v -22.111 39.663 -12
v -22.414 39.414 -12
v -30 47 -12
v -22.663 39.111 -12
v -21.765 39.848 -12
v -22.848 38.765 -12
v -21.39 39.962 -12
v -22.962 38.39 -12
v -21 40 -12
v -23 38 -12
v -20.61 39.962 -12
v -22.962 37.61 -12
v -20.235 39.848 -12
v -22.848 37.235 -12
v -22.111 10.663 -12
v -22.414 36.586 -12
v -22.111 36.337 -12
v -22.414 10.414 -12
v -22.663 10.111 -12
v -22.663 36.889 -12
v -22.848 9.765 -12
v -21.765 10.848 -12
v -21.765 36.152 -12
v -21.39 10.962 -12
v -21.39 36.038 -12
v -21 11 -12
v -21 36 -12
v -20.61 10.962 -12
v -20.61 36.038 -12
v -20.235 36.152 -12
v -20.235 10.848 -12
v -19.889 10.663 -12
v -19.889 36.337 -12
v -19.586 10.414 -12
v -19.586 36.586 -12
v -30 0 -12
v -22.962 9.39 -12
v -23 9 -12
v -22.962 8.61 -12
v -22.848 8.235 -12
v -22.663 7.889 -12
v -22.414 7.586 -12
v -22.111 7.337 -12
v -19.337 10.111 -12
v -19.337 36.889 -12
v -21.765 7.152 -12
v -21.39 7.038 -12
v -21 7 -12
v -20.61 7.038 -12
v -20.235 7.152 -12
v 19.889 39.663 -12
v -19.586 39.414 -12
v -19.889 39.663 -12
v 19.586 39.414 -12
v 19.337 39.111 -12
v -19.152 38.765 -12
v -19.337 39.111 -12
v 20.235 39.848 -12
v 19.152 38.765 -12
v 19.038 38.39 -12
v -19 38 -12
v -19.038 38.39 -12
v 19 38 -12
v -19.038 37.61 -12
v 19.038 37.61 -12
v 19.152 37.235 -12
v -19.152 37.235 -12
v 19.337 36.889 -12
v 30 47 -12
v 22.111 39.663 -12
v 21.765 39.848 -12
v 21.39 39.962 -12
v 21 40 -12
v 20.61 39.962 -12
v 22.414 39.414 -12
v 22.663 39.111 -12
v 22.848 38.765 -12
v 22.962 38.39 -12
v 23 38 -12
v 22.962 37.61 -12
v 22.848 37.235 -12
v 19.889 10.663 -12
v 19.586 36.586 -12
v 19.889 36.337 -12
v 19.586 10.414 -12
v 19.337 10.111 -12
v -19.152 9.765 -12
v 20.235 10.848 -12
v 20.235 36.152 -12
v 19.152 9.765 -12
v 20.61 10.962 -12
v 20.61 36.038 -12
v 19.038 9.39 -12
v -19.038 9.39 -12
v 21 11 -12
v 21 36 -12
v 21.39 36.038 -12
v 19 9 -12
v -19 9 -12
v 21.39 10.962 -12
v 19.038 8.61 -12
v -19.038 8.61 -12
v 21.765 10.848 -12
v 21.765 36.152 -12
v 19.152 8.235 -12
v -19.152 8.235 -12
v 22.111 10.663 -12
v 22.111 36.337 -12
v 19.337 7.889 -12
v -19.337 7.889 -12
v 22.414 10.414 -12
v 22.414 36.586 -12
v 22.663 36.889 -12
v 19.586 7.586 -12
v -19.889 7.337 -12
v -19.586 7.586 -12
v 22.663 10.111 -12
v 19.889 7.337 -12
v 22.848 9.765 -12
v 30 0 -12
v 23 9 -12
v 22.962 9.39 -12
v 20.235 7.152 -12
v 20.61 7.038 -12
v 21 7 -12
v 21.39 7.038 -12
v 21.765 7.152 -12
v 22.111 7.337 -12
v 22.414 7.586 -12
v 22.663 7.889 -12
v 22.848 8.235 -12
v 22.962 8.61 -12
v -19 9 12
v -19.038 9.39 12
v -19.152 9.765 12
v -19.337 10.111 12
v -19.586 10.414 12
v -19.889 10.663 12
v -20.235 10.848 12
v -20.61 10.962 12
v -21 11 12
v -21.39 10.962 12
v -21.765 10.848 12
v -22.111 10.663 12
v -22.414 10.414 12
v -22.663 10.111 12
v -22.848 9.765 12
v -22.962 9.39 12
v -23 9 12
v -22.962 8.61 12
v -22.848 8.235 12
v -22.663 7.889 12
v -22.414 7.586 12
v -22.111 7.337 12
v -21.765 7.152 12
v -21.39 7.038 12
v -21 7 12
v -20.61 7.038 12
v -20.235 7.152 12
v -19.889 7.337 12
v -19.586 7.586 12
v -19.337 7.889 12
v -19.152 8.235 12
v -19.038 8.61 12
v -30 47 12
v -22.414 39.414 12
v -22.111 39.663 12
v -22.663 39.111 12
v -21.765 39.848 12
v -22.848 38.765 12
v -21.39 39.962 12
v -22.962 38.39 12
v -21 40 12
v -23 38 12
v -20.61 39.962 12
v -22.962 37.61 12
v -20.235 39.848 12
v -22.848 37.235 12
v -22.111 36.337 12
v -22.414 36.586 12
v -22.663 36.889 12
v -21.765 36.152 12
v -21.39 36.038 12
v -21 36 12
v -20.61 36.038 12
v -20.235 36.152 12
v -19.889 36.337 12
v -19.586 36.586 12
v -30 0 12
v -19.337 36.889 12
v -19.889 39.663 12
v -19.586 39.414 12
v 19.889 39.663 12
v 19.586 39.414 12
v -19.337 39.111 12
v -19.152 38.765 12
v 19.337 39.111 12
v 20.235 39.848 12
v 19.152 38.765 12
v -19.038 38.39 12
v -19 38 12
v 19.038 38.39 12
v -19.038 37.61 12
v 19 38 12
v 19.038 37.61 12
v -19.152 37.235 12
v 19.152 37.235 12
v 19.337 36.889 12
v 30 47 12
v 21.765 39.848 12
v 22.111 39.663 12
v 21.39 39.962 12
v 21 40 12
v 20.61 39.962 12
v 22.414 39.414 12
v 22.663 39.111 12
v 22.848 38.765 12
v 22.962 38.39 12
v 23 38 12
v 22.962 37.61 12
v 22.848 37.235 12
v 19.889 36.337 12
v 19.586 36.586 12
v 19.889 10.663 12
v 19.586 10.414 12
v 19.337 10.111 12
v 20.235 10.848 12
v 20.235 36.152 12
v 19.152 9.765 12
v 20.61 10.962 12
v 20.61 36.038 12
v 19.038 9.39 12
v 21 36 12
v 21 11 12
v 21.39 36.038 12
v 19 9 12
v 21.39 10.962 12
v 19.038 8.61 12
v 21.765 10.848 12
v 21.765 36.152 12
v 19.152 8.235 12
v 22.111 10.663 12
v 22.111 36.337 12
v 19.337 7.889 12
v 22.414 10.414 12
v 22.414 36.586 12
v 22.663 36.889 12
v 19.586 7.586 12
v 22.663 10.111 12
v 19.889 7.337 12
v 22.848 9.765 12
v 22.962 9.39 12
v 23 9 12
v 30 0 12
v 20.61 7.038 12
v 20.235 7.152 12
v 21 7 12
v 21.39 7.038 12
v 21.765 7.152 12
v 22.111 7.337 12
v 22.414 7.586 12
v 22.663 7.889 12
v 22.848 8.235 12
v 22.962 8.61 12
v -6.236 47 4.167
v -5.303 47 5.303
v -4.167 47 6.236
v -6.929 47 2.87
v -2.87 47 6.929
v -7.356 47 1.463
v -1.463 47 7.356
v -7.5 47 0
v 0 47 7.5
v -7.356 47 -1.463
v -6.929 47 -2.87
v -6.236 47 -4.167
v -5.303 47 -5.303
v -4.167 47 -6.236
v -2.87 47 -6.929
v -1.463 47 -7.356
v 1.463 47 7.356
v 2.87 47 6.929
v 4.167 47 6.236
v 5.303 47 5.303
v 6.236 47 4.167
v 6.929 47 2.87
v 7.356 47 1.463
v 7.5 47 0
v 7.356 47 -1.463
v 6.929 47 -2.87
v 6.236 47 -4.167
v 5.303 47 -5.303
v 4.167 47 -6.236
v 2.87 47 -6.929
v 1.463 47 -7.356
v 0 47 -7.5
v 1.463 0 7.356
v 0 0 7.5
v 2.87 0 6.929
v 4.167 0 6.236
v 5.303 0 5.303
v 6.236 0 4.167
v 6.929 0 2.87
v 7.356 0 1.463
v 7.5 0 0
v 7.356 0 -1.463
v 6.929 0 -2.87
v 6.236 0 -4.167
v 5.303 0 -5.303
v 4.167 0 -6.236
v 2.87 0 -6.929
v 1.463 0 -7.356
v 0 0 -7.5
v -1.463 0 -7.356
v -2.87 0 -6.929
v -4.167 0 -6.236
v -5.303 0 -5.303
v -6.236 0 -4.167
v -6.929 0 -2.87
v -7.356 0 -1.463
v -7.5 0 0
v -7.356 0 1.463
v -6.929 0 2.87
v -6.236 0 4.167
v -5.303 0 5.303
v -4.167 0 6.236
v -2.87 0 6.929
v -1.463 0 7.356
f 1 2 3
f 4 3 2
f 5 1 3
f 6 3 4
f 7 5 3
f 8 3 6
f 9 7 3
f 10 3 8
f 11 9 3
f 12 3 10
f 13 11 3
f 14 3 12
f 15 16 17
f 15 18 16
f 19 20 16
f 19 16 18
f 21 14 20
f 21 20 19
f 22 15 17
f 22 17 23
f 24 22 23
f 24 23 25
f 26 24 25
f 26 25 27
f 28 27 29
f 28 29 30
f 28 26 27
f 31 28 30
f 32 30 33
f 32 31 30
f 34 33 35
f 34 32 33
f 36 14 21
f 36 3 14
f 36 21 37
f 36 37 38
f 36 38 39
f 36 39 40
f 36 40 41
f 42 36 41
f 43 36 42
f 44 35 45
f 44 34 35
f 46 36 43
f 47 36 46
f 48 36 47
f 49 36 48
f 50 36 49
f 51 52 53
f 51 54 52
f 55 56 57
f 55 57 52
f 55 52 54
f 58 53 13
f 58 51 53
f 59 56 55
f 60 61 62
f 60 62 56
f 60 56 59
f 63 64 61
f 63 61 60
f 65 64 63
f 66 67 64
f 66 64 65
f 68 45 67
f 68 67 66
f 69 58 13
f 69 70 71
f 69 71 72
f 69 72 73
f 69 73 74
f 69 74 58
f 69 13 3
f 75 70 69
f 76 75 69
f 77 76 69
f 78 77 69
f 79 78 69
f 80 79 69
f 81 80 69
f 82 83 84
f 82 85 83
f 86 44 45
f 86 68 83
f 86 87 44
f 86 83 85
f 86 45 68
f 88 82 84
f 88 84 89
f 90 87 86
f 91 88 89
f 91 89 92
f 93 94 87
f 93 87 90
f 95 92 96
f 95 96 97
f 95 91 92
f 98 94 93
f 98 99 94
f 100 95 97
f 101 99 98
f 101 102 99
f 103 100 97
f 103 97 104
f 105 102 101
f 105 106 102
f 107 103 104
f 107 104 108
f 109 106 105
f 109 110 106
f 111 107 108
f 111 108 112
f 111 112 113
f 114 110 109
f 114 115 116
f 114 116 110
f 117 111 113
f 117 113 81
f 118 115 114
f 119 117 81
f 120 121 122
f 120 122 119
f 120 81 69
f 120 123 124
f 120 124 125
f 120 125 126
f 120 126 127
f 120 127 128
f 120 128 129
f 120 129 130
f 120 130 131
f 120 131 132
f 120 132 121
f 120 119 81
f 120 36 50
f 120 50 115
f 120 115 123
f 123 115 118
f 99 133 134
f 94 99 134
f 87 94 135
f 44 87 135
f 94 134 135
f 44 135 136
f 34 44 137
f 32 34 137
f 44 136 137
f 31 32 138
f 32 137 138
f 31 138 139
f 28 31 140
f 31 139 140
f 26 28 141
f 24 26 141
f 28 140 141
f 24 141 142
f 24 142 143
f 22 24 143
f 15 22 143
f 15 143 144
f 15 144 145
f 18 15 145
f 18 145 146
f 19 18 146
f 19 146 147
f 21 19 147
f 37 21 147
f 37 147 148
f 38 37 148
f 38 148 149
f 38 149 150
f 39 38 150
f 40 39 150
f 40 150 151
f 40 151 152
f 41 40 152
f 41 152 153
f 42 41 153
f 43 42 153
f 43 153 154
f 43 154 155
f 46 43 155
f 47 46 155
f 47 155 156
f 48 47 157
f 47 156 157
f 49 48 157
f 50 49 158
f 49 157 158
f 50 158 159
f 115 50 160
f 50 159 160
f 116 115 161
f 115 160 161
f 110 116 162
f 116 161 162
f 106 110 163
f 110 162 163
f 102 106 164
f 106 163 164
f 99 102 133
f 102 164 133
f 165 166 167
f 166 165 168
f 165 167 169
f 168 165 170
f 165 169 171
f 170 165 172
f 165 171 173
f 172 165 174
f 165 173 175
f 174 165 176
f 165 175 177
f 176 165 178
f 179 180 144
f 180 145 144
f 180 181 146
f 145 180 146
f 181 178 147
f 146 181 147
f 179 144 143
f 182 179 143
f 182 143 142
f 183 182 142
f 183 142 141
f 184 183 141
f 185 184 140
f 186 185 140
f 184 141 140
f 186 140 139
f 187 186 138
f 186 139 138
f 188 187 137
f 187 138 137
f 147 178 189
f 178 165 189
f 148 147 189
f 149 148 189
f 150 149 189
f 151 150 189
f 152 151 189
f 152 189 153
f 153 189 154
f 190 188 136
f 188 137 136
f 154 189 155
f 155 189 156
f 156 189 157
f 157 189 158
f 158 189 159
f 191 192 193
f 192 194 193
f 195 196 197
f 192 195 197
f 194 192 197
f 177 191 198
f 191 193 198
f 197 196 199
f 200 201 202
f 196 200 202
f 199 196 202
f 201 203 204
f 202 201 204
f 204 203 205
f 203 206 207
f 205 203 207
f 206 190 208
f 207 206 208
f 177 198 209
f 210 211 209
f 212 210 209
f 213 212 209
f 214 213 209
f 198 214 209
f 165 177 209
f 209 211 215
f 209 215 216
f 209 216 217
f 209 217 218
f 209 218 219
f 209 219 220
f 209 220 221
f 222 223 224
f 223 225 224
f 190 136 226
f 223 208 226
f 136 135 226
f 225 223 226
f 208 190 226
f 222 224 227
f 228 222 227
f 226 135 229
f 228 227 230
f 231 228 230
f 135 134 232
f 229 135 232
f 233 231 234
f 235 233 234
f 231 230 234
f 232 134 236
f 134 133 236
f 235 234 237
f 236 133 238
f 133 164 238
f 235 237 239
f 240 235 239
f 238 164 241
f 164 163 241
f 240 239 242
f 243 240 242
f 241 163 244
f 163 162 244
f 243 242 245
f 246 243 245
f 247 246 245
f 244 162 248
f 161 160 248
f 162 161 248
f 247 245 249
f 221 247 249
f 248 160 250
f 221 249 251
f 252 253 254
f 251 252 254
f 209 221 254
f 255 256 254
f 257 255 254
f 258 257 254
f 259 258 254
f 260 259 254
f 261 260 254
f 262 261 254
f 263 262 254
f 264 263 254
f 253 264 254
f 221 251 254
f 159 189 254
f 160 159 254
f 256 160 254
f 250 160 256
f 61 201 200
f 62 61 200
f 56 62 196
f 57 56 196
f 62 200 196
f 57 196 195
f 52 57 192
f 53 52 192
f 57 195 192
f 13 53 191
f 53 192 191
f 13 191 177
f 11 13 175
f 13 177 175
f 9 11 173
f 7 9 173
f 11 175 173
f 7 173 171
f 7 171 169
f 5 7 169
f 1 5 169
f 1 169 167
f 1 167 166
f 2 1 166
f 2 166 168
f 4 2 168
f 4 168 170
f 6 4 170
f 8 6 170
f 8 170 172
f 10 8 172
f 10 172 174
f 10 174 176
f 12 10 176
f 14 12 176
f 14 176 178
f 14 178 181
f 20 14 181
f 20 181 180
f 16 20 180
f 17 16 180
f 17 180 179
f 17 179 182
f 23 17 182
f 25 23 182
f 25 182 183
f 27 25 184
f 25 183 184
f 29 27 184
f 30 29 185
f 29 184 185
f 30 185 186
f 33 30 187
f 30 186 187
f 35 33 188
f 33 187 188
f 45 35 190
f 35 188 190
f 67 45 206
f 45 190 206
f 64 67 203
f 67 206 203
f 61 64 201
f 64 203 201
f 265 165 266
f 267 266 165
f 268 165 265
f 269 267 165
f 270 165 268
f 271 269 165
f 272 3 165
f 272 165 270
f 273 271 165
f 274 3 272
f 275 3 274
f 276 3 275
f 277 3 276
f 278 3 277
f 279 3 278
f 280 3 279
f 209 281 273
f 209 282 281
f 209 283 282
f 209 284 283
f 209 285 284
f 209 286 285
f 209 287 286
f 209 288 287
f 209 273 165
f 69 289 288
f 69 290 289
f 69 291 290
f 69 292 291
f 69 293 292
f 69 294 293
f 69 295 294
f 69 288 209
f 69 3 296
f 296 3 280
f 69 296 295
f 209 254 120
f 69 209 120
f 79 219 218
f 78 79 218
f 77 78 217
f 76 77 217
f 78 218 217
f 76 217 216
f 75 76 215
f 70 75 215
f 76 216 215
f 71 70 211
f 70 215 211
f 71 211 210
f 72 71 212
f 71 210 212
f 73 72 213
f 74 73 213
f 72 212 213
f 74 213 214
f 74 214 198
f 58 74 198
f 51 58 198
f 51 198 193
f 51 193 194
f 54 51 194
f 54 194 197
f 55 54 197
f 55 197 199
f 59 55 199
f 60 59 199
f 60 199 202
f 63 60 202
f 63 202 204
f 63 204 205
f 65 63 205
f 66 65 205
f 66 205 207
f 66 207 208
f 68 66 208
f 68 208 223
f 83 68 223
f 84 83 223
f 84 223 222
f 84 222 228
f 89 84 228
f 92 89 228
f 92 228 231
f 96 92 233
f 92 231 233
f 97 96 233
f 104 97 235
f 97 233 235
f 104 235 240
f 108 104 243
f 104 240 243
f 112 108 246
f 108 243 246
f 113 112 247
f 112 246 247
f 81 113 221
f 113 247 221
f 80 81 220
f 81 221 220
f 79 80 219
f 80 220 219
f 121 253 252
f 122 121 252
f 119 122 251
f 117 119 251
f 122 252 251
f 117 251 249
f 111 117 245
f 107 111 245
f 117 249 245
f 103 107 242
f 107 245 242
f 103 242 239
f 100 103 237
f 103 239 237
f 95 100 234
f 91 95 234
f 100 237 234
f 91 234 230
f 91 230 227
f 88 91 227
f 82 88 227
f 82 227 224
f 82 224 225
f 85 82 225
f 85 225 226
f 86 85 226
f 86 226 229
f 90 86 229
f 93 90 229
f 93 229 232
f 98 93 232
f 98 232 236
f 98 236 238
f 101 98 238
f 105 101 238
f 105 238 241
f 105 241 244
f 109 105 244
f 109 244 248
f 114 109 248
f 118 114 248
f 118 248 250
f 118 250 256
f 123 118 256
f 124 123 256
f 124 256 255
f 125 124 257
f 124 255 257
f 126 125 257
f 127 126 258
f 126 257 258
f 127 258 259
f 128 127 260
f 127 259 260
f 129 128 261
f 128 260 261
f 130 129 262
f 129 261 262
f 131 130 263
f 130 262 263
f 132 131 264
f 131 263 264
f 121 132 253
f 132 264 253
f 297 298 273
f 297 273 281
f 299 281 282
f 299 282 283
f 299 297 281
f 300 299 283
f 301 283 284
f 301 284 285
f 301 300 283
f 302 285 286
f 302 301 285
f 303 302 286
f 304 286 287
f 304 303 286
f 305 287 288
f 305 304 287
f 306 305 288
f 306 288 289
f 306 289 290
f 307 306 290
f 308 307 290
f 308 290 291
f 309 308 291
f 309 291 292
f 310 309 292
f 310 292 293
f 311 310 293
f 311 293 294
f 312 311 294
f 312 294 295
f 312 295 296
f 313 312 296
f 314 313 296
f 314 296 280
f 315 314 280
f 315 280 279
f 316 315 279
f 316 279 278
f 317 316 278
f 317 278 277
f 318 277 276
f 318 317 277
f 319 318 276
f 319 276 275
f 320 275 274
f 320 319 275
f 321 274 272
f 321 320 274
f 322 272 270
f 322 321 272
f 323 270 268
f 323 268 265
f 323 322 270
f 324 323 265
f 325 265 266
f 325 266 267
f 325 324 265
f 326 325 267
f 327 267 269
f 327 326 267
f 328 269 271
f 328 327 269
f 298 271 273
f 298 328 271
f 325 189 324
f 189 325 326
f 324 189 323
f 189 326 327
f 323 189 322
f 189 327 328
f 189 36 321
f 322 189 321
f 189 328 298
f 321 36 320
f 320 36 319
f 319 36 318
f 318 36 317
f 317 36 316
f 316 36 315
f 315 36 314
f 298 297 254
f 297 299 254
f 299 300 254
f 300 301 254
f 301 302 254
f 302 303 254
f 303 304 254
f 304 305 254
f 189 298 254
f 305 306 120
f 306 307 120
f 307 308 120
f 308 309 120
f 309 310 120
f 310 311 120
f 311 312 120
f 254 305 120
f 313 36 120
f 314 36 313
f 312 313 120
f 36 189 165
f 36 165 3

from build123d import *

# Parameters (mm, degrees)
SKETCH2_W           = 60
SKETCH2_H           = 24
SKETCH2_R           = 7.5
BOSS_EXTRUDE1_DEPTH = 47
SKETCH2_2_W         = 60
SKETCH2_2_H         = 24
SKETCH2_2_R         = 7.5
BOSS_EXTRUDE2_DEPTH = 25.5
SKETCH8_R           = 2
CUT_EXTRUDE1_DEPTH  = 61.704200843


with BuildPart() as part:
    # Sketch2 → Boss-Extrude1 (new body)
    with BuildSketch(Plane(origin=(0, 0, 0), x_dir=(1, 0, 0), z_dir=(0, 1, 0))):
        Rectangle(SKETCH2_W, SKETCH2_H)
        Circle(SKETCH2_R, mode=Mode.SUBTRACT)
    extrude(amount=BOSS_EXTRUDE1_DEPTH)

    # Sketch2<2> → Boss-Extrude2 (add)
    with BuildSketch(Plane(origin=(0, 0, 0), x_dir=(1, 0, 0), z_dir=(0, 1, 0))):
        Rectangle(SKETCH2_2_W, SKETCH2_2_H)
        Circle(SKETCH2_2_R, mode=Mode.SUBTRACT)
    extrude(amount=BOSS_EXTRUDE2_DEPTH)

    # Sketch8 → Cut-Extrude1 (cut, through all)
    with BuildSketch(Plane.XY.offset(12)):
        with Locations((-21, 9)):
            Circle(SKETCH8_R)
        with Locations((-21, 38)):
            Circle(SKETCH8_R)
        with Locations((21, 38)):
            Circle(SKETCH8_R)
        with Locations((21, 9)):
            Circle(SKETCH8_R)
    extrude(amount=-CUT_EXTRUDE1_DEPTH, mode=Mode.SUBTRACT)


solid = part.part
